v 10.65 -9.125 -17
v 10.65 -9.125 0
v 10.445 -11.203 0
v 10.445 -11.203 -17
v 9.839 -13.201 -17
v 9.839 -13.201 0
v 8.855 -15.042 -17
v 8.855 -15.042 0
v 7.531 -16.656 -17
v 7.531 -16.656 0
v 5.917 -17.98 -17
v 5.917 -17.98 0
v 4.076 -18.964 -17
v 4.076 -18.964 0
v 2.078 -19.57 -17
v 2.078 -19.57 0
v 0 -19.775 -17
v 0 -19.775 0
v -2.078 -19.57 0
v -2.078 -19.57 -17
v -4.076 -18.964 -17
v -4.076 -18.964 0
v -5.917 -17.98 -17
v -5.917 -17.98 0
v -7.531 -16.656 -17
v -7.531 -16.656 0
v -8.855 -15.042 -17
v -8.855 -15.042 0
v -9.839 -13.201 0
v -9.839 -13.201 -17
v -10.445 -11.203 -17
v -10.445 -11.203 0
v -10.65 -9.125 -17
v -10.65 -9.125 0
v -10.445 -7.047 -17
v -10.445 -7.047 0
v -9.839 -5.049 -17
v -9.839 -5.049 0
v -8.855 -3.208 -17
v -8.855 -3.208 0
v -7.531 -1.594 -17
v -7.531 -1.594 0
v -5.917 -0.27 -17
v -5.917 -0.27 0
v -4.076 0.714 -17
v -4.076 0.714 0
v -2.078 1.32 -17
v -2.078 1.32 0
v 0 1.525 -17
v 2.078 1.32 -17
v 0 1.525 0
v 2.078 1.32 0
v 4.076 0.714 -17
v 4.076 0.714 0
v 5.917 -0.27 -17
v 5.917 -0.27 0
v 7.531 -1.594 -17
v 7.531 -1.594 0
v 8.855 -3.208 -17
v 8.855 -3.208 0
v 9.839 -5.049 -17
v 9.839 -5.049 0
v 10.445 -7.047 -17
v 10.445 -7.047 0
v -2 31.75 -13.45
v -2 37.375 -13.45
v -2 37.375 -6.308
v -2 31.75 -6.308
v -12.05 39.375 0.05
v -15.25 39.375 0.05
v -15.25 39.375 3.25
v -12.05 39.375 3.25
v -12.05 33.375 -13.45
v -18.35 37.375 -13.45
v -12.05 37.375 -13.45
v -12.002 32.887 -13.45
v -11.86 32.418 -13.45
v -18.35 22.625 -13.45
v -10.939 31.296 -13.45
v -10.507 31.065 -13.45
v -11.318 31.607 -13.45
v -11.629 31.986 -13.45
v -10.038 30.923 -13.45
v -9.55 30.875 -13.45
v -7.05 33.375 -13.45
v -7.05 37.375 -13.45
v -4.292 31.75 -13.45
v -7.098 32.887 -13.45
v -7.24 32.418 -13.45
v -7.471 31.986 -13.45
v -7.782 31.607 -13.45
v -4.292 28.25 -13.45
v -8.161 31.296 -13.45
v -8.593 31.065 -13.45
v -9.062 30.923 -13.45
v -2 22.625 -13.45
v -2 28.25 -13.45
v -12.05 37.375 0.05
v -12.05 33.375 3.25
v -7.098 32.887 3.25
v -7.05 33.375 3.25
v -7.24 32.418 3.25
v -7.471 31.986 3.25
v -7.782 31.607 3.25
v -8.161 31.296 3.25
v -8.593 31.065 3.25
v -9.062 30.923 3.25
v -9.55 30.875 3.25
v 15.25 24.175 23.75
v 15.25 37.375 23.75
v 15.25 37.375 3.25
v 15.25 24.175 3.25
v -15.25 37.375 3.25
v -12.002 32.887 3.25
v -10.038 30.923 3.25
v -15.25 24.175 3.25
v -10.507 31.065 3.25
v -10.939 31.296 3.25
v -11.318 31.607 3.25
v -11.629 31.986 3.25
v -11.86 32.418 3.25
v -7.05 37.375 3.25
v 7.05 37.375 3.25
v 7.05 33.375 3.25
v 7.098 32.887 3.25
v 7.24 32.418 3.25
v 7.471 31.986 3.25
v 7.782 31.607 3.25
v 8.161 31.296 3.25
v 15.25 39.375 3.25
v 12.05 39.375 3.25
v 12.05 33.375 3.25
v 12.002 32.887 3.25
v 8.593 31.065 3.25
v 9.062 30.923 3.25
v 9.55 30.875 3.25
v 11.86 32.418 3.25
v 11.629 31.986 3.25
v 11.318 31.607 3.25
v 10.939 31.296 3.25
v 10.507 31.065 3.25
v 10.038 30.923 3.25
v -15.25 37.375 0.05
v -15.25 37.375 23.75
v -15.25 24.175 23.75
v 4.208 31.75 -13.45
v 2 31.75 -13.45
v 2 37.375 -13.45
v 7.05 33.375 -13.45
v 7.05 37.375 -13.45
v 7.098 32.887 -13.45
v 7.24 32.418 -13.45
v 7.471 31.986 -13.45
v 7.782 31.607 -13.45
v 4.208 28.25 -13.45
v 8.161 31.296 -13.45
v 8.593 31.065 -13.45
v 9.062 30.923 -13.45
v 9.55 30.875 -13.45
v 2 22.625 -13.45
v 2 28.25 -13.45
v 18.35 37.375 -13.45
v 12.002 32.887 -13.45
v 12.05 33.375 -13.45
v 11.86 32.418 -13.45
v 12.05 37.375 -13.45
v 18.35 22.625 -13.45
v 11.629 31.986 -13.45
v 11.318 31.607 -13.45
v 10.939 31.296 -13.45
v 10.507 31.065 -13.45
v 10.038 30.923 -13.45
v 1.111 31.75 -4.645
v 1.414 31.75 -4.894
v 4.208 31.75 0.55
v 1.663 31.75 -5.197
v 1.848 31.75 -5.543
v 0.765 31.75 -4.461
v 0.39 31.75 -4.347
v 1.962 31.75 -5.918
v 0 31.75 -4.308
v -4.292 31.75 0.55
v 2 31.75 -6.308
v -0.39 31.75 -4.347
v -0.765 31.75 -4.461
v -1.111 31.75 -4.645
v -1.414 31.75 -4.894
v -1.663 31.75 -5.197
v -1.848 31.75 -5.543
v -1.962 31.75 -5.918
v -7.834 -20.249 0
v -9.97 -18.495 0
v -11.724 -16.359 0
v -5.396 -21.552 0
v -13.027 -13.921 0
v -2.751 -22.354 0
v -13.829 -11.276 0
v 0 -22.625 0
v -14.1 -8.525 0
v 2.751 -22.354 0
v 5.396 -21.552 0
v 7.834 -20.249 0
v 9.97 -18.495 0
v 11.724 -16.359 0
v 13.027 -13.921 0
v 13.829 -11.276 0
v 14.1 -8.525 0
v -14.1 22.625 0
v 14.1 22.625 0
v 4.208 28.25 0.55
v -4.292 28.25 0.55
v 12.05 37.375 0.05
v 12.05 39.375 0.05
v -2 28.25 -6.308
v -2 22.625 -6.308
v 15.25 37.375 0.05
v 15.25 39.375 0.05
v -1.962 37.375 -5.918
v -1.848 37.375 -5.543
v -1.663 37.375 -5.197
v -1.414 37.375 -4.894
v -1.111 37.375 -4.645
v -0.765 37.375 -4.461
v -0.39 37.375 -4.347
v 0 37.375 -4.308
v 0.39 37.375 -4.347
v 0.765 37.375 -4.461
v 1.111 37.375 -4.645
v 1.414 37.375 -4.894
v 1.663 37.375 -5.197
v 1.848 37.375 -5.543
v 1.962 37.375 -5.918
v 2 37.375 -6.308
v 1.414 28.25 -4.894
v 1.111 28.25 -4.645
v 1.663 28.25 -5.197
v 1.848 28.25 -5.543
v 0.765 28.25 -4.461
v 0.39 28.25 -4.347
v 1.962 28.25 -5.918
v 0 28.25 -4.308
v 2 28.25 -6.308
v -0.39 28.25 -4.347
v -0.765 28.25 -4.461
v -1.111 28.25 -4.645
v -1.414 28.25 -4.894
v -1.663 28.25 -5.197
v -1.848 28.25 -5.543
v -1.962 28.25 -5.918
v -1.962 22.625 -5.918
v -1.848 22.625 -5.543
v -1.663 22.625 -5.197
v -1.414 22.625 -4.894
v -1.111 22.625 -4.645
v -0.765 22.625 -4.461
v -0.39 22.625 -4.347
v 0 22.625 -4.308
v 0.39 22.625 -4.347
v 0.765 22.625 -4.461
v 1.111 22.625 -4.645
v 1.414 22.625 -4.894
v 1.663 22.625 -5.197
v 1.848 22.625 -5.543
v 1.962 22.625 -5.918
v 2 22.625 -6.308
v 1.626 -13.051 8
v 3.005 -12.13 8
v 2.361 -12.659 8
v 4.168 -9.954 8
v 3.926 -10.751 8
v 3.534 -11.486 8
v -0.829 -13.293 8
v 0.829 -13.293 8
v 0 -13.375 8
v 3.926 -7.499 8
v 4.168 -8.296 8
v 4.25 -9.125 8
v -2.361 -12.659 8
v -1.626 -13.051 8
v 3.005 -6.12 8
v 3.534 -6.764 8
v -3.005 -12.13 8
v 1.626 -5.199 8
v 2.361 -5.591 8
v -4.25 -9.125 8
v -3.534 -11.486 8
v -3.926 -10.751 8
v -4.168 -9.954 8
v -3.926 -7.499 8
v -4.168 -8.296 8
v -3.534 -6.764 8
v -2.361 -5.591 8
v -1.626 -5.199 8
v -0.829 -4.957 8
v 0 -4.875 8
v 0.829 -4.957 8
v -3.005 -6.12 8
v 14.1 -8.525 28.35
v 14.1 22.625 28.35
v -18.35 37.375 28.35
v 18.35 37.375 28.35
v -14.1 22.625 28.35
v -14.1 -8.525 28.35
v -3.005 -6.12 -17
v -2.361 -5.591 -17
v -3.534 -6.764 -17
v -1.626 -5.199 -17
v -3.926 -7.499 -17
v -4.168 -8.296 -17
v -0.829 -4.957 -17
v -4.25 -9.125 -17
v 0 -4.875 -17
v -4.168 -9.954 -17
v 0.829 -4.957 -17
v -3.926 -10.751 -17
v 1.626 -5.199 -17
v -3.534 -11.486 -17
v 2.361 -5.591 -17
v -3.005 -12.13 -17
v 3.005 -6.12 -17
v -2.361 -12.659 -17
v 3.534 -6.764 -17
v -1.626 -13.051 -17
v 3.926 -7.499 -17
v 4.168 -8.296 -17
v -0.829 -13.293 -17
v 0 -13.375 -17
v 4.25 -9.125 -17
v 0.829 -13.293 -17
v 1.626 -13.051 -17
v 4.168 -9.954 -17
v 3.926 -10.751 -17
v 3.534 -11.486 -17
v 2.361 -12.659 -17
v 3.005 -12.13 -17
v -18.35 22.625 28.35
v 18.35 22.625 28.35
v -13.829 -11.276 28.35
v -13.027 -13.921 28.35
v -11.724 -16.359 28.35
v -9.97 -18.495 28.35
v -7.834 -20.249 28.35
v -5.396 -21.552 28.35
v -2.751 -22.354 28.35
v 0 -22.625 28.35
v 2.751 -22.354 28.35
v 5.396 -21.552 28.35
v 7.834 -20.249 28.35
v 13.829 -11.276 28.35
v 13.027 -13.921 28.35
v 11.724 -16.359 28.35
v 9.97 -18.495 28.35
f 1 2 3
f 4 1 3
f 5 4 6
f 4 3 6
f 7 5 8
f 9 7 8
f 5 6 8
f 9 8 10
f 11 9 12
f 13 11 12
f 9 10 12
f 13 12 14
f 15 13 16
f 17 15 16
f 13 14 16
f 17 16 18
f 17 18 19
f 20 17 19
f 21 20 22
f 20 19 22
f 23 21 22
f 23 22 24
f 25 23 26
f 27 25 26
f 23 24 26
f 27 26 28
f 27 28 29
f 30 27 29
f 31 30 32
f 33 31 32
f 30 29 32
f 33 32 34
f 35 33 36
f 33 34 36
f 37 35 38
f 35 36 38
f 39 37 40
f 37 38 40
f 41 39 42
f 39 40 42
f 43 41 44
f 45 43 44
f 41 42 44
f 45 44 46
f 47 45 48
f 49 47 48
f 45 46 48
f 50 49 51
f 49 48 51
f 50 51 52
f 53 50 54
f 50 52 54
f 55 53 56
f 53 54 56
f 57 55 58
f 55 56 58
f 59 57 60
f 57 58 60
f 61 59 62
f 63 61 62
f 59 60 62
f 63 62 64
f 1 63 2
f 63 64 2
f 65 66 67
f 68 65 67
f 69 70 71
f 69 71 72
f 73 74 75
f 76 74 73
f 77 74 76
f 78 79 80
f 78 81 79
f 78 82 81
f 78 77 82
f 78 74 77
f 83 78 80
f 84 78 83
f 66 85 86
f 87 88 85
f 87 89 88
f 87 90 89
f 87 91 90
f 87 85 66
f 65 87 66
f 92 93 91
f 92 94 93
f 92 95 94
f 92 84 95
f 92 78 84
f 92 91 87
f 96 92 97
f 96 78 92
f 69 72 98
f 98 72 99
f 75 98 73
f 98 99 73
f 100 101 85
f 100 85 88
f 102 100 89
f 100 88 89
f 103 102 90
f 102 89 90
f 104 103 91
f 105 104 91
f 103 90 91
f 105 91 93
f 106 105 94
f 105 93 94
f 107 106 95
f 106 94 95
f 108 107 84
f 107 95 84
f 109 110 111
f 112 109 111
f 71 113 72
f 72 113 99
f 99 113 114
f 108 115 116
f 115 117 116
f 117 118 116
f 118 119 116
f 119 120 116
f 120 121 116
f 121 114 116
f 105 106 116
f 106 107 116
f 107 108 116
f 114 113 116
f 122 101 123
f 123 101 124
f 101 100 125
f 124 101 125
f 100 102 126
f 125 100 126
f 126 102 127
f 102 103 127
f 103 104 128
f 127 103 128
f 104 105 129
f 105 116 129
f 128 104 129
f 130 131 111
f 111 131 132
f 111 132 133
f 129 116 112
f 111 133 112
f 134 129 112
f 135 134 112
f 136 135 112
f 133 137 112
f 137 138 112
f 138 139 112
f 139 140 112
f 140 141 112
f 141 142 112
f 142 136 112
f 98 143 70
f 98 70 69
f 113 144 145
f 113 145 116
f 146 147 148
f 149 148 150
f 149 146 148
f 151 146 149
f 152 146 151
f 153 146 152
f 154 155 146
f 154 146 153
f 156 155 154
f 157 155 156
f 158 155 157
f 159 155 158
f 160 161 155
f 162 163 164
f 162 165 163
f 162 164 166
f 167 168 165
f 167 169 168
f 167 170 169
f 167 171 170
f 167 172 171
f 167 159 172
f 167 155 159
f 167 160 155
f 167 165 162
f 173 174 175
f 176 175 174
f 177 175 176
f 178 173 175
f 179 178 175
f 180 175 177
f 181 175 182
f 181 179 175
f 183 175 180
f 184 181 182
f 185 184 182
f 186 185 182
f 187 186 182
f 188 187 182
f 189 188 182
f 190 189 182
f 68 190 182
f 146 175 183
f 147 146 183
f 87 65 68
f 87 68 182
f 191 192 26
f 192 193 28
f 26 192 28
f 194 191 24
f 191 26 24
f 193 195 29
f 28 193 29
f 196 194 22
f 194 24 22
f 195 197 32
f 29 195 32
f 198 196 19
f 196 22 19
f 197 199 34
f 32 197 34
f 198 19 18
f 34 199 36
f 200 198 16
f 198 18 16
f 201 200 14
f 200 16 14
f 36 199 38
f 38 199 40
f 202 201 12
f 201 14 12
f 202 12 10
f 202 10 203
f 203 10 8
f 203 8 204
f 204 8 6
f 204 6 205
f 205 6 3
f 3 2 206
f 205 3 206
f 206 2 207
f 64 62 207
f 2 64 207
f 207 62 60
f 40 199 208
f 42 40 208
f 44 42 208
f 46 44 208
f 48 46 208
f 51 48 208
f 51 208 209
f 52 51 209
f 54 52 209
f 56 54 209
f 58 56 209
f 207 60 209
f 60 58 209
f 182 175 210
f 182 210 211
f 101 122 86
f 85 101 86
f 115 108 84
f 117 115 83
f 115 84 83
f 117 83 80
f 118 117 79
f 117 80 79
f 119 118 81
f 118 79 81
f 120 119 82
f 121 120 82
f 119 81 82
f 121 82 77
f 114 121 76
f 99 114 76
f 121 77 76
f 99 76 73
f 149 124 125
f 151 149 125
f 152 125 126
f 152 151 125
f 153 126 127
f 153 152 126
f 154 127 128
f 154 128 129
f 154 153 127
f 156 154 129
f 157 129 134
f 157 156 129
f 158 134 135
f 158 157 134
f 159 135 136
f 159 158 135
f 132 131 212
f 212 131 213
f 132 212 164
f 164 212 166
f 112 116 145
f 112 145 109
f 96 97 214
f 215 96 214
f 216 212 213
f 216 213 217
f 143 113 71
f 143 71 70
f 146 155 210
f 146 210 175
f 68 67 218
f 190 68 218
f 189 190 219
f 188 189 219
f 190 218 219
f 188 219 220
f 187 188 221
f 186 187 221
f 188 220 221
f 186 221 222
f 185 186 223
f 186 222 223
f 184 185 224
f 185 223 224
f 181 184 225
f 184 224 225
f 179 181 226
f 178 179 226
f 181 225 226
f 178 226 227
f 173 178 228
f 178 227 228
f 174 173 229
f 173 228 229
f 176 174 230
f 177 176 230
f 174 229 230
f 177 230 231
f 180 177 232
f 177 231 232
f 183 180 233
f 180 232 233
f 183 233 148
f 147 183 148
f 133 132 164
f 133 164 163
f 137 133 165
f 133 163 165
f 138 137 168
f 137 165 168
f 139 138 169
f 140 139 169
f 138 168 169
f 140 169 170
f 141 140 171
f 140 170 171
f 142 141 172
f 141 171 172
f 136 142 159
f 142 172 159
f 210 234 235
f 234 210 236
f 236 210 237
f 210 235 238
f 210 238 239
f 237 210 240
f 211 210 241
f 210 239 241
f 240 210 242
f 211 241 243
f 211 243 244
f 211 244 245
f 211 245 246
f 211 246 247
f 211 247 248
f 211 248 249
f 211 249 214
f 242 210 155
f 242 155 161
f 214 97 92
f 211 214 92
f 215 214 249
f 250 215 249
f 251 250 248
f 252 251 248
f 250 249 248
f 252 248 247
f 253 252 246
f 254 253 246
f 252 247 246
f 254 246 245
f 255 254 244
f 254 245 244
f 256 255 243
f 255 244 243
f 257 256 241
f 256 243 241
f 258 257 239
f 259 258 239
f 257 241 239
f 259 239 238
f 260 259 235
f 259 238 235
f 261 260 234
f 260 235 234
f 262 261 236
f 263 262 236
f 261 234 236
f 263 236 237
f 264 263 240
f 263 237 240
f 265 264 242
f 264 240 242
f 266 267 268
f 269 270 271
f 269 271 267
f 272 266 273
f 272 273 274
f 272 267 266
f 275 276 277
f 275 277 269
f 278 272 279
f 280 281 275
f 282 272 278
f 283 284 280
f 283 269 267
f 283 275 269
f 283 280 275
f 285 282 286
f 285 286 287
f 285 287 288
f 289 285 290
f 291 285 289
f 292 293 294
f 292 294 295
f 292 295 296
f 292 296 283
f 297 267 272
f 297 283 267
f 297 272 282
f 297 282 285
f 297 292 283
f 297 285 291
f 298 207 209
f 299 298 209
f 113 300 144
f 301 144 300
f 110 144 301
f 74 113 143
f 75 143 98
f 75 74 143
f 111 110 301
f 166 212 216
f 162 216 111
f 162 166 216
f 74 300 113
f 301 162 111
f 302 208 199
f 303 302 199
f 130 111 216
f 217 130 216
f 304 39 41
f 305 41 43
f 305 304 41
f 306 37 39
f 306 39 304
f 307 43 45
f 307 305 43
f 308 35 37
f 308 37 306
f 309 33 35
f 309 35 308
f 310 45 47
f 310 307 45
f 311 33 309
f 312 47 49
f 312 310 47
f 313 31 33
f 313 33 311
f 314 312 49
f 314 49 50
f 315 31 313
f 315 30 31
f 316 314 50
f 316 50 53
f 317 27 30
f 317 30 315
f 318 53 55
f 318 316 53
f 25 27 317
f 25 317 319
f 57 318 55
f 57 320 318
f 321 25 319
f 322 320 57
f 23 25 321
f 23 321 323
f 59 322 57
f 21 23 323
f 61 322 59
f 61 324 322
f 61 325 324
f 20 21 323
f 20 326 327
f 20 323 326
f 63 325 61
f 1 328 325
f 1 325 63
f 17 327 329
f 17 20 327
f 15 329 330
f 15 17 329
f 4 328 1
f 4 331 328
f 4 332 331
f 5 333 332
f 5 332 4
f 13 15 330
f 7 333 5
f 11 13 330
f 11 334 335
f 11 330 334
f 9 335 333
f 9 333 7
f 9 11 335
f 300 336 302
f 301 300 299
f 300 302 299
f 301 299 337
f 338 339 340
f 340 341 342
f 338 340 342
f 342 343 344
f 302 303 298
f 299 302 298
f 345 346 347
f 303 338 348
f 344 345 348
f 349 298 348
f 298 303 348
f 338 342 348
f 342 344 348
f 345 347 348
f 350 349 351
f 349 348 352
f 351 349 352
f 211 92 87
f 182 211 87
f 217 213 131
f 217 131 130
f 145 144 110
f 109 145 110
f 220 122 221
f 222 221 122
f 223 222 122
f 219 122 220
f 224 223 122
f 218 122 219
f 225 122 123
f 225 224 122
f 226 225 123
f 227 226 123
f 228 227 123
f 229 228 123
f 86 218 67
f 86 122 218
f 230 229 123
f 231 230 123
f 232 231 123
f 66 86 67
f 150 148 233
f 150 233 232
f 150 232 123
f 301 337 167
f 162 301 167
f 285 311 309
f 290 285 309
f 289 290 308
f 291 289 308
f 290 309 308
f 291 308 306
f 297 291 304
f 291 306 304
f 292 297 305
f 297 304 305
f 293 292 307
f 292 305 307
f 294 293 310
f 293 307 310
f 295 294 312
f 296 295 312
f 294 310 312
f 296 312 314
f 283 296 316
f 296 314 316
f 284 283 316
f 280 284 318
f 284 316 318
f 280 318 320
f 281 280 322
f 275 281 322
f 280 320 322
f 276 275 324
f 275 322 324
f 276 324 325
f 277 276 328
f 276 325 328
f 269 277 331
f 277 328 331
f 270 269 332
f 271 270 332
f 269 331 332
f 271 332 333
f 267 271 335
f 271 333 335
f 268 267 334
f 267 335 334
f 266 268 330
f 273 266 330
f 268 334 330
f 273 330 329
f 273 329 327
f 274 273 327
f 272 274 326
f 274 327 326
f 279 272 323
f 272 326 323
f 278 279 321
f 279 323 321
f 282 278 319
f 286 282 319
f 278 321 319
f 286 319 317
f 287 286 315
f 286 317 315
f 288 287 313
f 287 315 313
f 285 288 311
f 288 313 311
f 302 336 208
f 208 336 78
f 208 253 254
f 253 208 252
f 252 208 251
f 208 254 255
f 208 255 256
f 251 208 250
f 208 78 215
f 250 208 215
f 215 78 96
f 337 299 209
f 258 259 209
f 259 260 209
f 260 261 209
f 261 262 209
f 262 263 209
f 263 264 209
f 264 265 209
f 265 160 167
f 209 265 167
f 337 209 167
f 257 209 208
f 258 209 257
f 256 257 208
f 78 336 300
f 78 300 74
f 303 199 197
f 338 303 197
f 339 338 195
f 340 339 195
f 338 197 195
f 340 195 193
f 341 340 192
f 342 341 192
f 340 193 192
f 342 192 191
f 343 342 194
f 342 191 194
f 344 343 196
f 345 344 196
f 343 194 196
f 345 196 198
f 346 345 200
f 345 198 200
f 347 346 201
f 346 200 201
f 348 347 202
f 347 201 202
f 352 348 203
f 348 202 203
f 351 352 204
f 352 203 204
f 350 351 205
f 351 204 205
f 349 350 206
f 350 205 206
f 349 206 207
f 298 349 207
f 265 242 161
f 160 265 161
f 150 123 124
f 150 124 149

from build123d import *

# Parameters (mm, degrees)
RESSALTO_EXTRUS_O1_DEPTH = 28.35
ESBO_O3_W                = 36.7
ESBO_O3_H                = 41.8
RESSALTO_EXTRUS_O2_DEPTH = 14.75
ESBO_O5_W                = 30.5
ESBO_O5_H                = 20.5
CORTE_EXTRUS_O2_DEPTH    = 13.2
CORTE_EXTRUS_O3_DEPTH    = 69.850889609
ESBO_O7_W                = 5
ESBO_O7_H                = 16.7
CORTE_EXTRUS_O4_DEPTH    = 6.5
FILETE1_R                = 2.5
ESBO_O8_W                = 8.5
ESBO_O8_H                = 3.5
CORTE_EXTRUS_O5_DEPTH    = 14
ESBO_O9_W                = 3.2
ESBO_O9_H                = 3.2
RESSALTO_EXTRUS_O3_DEPTH = 2
ESBO_O10_R               = 10.65
RESSALTO_EXTRUS_O4_DEPTH = 17
ESBO_O11_R               = 4.25
CORTE_EXTRUS_O6_DEPTH    = 25


with BuildPart() as part:
    # Esboço1 → Ressalto-extrusão1 (new body)
    with BuildSketch(Plane.XY):
        with BuildLine():
            Line((14.1, -8.525), (14.1, 22.625))
            Line((14.1, 22.625), (-14.1, 22.625))
            Line((-14.1, 22.625), (-14.1, -8.525))
            ThreePointArc((-14.1, -8.525), (0, -22.625), (14.1, -8.525))
        make_face()
    extrude(amount=RESSALTO_EXTRUS_O1_DEPTH)

    # Esboço3 → Ressalto-extrusão2 (add)
    with BuildSketch(Plane(origin=(0, 22.625, 0), x_dir=(1, 0, 0), z_dir=(0, 1, 0))):
        with Locations((0, -7.45)):
            Rectangle(ESBO_O3_W, ESBO_O3_H)
    extrude(amount=RESSALTO_EXTRUS_O2_DEPTH)

    # Esboço5 → Corte-extrusão2 (cut)
    with BuildSketch(Plane(origin=(0, 37.375, 0), x_dir=(1, 0, 0), z_dir=(0, 1, 0))):
        with Locations((0, -13.5)):
            Rectangle(ESBO_O5_W, ESBO_O5_H)
    extrude(amount=-CORTE_EXTRUS_O2_DEPTH, mode=Mode.SUBTRACT)

    # Esboço6 → Corte-extrusão3 (cut, through all)
    with BuildSketch(Plane(origin=(0, 37.375, 0), x_dir=(1, 0, 0), z_dir=(0, 1, 0))):
        with BuildLine():
            Line((-2, 13.45), (-2, 6.30835312))
            ThreePointArc((-2, 6.30835312), (0, 4.30835312), (2, 6.30835312))
            Line((2, 6.30835312), (2, 13.45))
            Line((2, 13.45), (-2, 13.45))
        make_face()
    extrude(amount=-CORTE_EXTRUS_O3_DEPTH, mode=Mode.SUBTRACT)

    # Esboço7 → Corte-extrusão4 (cut)
    with BuildSketch(Plane(origin=(0, 37.375, 0), x_dir=(1, 0, 0), z_dir=(0, 1, 0))):
        with Locations((-9.55, 5.1)):
            Rectangle(ESBO_O7_W, ESBO_O7_H)
        with Locations((9.55, 5.1)):
            Rectangle(ESBO_O7_W, ESBO_O7_H)
    extrude(amount=-CORTE_EXTRUS_O4_DEPTH, mode=Mode.SUBTRACT)

    # Filete1
    filete1_edges = [part.edges().sort_by_distance(p)[0] for p in [
        (-12.05, 30.875, -5.1),
        (-7.05, 30.875, -5.1),
        (7.05, 30.875, -5.1),
        (12.05, 30.875, -5.1),
    ]]
    fillet(filete1_edges, radius=FILETE1_R - 0.0001)  # a hair under: the kernel refuses the full size

    # Esboço8 → Corte-extrusão5 (cut)
    with BuildSketch(Plane(origin=(0, 0, -13.45), x_dir=(-1, 0, 0), z_dir=(0, 0, -1))):
        with Locations((0.04245602, 30)):
            Rectangle(ESBO_O8_W, ESBO_O8_H)
    extrude(amount=-CORTE_EXTRUS_O5_DEPTH, mode=Mode.SUBTRACT)

    # Esboço9 → Ressalto-extrusão3 (add)
    with BuildSketch(Plane(origin=(0, 37.375, 0), x_dir=(1, 0, 0), z_dir=(0, 1, 0))):
        with Locations((-13.65, -1.65)):
            Rectangle(ESBO_O9_W, ESBO_O9_H)
        with Locations((13.65, -1.65)):
            Rectangle(ESBO_O9_W, ESBO_O9_H)
    extrude(amount=RESSALTO_EXTRUS_O3_DEPTH)

    # Esboço10 → Ressalto-extrusão4 (add)
    with BuildSketch(Plane(origin=(0, 0, 0), x_dir=(-1, 0, 0), z_dir=(0, 0, -1))):
        with Locations(Location((0, -9.125, 0), (0, 0, 180))):
            Circle(ESBO_O10_R)
    extrude(amount=RESSALTO_EXTRUS_O4_DEPTH)

    # Esboço11 → Corte-extrusão6 (cut)
    with BuildSketch(Plane(origin=(0, 0, -17), x_dir=(-1, 0, 0), z_dir=(0, 0, -1))):
        with Locations((0, -9.125)):
            Circle(ESBO_O11_R)
    extrude(amount=-CORTE_EXTRUS_O6_DEPTH, mode=Mode.SUBTRACT)


solid = part.part
